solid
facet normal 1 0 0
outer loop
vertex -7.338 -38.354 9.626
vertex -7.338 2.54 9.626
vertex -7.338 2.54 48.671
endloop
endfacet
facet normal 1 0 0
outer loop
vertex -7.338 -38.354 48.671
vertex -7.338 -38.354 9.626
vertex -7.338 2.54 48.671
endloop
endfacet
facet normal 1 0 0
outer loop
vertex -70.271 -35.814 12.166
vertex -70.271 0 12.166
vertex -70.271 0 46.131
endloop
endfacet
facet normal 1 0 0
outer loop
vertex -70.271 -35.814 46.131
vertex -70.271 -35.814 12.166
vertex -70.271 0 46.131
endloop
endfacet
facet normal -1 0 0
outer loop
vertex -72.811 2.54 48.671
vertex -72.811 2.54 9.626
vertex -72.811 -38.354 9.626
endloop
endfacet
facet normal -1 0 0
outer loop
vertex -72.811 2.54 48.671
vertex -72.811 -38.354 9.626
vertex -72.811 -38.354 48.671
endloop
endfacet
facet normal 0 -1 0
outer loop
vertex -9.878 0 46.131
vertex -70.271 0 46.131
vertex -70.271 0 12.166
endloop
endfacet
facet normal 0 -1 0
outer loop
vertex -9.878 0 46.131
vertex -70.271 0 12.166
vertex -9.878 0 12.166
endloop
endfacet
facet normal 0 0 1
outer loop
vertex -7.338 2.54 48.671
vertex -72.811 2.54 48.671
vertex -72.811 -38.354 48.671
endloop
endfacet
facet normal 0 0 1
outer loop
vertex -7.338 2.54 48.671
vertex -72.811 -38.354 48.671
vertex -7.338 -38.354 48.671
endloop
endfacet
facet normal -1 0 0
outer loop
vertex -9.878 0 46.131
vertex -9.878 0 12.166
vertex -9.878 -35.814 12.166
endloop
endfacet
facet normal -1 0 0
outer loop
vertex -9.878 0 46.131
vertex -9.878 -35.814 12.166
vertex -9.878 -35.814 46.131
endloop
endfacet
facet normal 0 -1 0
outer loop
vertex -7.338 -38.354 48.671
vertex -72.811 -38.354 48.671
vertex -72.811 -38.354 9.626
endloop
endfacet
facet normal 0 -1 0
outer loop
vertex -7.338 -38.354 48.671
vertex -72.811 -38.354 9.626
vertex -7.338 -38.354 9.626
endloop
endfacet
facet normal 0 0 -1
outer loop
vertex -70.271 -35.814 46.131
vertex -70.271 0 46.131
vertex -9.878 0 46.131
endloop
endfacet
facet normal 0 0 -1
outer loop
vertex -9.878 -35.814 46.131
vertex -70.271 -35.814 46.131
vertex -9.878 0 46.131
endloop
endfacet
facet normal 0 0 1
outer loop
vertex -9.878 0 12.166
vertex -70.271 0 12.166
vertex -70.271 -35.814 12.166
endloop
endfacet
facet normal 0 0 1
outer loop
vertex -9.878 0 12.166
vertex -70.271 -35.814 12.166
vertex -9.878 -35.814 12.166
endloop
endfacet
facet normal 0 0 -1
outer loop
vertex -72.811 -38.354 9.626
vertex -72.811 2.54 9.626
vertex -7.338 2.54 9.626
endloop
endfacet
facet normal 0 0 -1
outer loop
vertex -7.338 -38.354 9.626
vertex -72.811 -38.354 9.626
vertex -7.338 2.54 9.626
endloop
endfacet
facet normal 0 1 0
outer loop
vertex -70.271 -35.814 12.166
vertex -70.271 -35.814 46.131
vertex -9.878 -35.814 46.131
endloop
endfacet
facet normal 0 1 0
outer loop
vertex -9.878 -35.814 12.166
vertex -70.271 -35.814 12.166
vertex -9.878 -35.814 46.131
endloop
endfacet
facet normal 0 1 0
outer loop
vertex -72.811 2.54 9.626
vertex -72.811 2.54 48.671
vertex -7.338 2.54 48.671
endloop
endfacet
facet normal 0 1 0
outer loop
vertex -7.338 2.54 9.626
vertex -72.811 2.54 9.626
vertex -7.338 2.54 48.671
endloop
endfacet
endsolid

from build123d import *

# Parameters (mm, degrees)
F0_W     = 60.3929003701
F0_H     = 33.9642912149
F1_DEPTH = 35.814
F2_T     = 2.54


with BuildPart() as f1:
    # F0 (on Front) → F1 (new body)
    with BuildSketch(Plane.XZ):
        with Locations((-40.0745426305, 29.1485004127)):
            Rectangle(F0_W, F0_H)
    extrude(amount=F1_DEPTH)

    # F2 (hollow, outwards: the wall grows on the outside; the body as it was is the cavity)
    f2_inside = f1.part
    offset(amount=F2_T, kind=Kind.INTERSECTION)
    add(f2_inside, mode=Mode.SUBTRACT)


solid = f1.part
